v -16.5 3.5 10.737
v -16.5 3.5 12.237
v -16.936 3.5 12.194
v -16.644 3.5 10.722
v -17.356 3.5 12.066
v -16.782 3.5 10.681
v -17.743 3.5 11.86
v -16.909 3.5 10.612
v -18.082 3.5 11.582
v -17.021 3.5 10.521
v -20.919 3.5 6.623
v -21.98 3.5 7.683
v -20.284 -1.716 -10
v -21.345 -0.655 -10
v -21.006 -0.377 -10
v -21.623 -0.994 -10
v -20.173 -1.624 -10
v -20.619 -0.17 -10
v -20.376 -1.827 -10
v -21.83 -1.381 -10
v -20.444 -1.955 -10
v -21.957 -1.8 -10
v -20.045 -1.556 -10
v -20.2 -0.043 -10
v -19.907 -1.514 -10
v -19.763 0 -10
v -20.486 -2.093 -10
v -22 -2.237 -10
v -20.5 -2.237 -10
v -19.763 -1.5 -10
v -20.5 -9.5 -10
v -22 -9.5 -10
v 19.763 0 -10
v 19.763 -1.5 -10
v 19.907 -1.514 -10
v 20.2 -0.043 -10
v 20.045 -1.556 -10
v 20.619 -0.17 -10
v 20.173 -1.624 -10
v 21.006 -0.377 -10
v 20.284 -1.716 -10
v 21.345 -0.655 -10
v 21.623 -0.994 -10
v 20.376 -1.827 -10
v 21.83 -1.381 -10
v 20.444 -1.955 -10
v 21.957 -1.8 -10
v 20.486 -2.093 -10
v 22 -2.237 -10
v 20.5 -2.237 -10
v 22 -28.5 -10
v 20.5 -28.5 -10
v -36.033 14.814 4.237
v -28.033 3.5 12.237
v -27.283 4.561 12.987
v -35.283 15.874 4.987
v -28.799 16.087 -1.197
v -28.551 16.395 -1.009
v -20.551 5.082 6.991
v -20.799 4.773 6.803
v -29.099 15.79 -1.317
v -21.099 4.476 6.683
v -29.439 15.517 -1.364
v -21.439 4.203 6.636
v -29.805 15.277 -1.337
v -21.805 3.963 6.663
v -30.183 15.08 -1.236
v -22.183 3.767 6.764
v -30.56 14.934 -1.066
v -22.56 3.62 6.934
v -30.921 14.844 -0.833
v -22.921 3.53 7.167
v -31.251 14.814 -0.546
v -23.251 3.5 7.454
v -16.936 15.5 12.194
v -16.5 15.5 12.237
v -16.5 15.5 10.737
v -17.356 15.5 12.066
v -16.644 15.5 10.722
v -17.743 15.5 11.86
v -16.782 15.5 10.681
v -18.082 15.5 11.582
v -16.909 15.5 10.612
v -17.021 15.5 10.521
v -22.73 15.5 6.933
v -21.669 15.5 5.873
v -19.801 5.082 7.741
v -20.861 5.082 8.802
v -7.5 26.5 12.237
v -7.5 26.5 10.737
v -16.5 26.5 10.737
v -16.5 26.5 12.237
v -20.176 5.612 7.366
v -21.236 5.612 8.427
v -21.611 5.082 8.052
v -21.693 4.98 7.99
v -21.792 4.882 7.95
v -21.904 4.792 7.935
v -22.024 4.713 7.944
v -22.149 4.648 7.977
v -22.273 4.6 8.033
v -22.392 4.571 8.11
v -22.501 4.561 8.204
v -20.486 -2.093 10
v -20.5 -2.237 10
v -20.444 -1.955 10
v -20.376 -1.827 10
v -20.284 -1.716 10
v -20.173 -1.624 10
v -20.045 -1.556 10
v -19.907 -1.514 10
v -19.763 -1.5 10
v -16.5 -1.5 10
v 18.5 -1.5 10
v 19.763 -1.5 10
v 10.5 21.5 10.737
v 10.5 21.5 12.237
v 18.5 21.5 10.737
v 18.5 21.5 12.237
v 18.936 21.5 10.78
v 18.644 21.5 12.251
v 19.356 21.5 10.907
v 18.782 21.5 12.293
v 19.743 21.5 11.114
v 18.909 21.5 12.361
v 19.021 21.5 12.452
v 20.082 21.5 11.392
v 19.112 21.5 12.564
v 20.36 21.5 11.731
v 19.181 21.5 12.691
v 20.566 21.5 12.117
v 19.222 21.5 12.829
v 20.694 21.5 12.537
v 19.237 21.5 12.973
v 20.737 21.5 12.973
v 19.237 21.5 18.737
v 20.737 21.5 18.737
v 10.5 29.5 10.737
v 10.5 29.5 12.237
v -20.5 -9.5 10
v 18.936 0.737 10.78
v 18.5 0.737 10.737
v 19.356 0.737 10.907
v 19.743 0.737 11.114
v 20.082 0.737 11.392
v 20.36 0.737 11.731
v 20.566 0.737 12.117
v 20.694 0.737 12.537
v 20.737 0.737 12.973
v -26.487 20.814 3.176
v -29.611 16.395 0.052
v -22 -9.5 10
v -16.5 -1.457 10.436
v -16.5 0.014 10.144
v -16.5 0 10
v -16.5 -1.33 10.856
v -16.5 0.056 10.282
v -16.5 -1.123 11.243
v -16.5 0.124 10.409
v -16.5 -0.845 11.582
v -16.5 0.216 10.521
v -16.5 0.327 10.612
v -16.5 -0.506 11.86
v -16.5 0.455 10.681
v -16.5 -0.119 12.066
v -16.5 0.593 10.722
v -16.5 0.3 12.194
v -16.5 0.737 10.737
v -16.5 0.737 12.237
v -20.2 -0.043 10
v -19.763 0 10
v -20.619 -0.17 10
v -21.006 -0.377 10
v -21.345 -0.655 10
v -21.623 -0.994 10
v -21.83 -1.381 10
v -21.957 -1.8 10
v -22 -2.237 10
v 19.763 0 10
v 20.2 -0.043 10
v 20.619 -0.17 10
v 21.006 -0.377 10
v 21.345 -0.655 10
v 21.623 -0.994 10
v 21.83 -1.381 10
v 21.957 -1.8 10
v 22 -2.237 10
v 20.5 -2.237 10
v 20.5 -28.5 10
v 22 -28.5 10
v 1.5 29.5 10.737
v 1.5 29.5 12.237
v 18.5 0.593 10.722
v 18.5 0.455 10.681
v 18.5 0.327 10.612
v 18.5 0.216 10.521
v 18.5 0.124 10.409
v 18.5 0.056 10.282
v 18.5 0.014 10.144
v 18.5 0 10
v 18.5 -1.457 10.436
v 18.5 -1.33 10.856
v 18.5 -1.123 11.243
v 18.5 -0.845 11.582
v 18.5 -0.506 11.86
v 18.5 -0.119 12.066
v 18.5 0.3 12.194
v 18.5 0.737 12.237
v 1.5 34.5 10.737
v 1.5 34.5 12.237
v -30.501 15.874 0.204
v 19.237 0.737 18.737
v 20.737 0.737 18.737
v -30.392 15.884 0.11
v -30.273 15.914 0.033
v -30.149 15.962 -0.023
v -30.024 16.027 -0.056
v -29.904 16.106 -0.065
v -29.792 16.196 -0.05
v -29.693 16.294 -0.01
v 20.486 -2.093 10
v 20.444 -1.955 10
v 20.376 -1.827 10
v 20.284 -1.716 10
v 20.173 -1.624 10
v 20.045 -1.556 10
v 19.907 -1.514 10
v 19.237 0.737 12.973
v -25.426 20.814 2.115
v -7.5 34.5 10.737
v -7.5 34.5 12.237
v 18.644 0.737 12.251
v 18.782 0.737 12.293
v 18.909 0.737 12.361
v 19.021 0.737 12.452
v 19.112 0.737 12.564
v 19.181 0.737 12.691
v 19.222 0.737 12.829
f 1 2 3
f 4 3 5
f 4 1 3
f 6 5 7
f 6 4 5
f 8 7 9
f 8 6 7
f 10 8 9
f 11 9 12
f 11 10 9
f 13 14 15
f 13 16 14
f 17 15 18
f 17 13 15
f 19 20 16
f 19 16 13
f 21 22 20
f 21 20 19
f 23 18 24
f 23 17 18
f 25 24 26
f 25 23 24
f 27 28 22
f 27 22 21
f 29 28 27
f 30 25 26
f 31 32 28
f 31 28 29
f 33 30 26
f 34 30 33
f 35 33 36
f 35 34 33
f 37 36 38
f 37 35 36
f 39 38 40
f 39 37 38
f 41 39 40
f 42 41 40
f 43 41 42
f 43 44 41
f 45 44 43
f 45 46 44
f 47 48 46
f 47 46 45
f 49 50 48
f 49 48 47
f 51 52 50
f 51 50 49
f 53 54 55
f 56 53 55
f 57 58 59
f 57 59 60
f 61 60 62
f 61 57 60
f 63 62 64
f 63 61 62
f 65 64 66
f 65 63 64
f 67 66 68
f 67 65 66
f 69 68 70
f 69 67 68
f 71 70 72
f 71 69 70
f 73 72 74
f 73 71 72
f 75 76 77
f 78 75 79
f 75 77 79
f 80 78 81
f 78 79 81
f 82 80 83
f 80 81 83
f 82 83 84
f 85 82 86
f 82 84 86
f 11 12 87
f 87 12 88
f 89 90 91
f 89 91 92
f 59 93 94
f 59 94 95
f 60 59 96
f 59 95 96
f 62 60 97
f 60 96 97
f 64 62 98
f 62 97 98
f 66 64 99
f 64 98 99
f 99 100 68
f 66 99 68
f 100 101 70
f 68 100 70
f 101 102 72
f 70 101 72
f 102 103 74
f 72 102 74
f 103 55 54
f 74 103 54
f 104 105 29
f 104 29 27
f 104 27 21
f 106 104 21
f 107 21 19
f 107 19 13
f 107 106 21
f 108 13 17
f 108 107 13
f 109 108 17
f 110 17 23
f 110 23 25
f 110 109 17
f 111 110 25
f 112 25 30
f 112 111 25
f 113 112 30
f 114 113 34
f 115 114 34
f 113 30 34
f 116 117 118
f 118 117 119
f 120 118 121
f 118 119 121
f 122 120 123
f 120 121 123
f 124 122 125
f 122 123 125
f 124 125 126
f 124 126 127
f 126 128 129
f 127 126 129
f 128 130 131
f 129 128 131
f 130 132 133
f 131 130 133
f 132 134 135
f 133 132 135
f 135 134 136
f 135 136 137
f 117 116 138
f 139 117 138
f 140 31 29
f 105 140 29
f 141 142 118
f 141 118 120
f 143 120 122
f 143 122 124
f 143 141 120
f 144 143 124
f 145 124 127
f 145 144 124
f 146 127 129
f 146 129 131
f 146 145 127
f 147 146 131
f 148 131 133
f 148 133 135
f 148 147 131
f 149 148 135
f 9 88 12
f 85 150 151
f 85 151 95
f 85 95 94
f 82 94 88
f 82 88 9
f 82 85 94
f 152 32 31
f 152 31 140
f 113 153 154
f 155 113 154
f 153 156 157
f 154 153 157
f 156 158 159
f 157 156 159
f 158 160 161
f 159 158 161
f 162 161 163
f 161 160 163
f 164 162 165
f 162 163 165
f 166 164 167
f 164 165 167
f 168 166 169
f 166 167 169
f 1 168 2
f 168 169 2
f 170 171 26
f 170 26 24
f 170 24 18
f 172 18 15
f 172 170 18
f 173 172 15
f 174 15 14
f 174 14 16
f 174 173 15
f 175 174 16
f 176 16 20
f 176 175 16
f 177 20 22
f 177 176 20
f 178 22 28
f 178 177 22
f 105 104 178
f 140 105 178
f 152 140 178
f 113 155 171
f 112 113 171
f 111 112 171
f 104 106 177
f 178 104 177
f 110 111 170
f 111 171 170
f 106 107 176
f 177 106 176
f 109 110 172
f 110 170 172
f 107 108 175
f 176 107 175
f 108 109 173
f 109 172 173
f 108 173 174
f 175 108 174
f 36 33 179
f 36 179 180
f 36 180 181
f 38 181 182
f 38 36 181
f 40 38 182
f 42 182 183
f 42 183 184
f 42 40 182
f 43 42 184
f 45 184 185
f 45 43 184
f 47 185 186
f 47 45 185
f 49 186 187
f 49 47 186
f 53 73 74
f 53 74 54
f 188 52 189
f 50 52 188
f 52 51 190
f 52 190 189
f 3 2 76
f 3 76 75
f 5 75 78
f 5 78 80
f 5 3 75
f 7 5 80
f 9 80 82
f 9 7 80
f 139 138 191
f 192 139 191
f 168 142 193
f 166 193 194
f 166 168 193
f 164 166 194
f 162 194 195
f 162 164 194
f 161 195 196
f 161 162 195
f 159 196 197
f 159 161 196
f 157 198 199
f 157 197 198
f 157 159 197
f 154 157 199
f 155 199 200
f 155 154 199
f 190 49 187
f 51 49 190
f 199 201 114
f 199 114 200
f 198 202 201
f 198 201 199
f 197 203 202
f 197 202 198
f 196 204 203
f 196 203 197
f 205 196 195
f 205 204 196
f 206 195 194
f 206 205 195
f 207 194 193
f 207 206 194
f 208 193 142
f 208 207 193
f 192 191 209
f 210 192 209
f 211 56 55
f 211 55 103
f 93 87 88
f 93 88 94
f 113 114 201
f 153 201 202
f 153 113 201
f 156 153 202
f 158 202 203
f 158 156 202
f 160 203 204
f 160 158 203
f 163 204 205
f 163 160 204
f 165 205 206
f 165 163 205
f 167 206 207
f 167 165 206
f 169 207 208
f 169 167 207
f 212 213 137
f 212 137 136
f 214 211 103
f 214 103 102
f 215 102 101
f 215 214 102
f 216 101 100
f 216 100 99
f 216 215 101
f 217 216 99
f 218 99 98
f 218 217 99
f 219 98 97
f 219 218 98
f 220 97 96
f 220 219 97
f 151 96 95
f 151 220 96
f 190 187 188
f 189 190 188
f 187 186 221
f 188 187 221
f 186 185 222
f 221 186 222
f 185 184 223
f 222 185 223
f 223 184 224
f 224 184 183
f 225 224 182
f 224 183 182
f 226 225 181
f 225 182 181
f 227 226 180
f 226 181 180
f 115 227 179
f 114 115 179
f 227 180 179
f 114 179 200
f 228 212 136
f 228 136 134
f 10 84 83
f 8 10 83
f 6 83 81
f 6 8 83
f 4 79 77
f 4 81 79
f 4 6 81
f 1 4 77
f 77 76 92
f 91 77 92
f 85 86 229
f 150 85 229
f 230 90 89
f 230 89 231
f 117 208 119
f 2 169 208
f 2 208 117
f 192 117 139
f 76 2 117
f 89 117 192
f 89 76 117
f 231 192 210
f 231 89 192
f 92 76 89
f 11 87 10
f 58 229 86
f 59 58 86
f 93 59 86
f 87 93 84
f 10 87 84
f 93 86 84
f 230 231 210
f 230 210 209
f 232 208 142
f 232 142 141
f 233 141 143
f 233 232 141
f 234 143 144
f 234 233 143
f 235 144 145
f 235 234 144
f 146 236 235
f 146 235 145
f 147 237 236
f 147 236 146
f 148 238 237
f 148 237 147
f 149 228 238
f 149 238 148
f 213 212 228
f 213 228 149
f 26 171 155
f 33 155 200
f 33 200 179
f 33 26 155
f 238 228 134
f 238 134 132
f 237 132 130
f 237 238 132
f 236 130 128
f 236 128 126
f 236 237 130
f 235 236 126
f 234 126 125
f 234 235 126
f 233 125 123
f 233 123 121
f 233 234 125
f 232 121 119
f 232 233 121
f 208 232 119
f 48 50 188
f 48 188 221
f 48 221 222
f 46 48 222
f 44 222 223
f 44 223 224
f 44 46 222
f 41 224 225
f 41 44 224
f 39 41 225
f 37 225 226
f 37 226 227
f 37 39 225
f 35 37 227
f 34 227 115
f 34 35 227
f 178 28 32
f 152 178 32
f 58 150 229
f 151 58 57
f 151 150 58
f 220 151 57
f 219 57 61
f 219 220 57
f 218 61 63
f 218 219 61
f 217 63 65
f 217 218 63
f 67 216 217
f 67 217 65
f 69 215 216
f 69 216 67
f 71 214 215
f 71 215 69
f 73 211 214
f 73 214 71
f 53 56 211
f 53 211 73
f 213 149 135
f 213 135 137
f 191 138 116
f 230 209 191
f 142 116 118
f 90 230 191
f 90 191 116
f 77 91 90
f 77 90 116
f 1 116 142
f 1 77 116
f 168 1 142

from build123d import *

# Parameters (mm, degrees)
CROQUIS2_W                         = 44
CROQUIS2_H                         = 20
BRIDA_BASE1_DEPTH                  = 1.5
BRIDA_DE_ARISTA1_STRIP_W           = 7.4732
BRIDA_DE_ARISTA1_STRIP_H           = 1.5
BRIDA_DE_ARISTA1_STRIP_CUT_DEPTH   = 20
BRIDA_DE_ARISTA1_STRIP_2_W         = 7.4732
BRIDA_DE_ARISTA1_STRIP_2_H         = 1.5
BRIDA_DE_ARISTA1_STRIP_CUT_2_DEPTH = 20
BRIDA_DE_ARISTA1_DEPTH             = 20
BRIDA_DE_ARISTA1_BEND_DEPTH        = 20
CROQUIS13_W                        = 20
CROQUIS13_H                        = 19
CORTAR_EXTRUIR1_DEPTH              = 2
BRIDA_DE_ARISTA2_DEPTH             = 39.5268
CORTAR_EXTRUIR2_START              = -22.2366
CORTAR_EXTRUIR2_OUTLINE_W          = 3.2634
CORTAR_EXTRUIR2_OUTLINE_H          = 39
CORTAR_EXTRUIR2_OUTLINE_W_2        = 1.2634
CORTAR_EXTRUIR2_DEPTH              = 2.2366
CROQUIS38_W                        = 9
CROQUIS38_H                        = 8
CORTAR_EXTRUIR3_DEPTH              = 35
BRIDA_DE_ARISTA3_DEPTH             = 20.7634
BRIDA_DE_ARISTA6_DEPTH             = 25.7634
CROQUIS51_W                        = 6.573569946
CROQUIS51_H                        = 2.7634
CROQUIS51_H_2                      = 11
CORTAR_EXTRUIR4_DEPTH              = 2
SALIENTE_EXTRUIR1_DEPTH            = 1.5
CORTAR_EXTRUIR5_DEPTH              = 51.641612746
CORTAR_EXTRUIR5_DEPTH_BACK         = 51.641612746
CROQUIS53_W                        = 1.581515027
CROQUIS53_H                        = 11
CROQUIS53_H_2                      = 2.7634
BRIDA_DE_ARISTA7_STRIP_W           = 7.4732
BRIDA_DE_ARISTA7_STRIP_H           = 1.5
BRIDA_DE_ARISTA7_STRIP_CUT_DEPTH   = 16
BRIDA_DE_ARISTA7_RELIEF_W          = 8.2232
BRIDA_DE_ARISTA7_RELIEF_H          = 0.75
BRIDA_DE_ARISTA7_RELIEF_CUT_DEPTH  = 1.5
BRIDA_DE_ARISTA7_DEPTH             = 16


# Read off the part's stored shape, not the designer's step: Cortar-Extruir2
# Sheet-metal steps are written as plain solids
with BuildPart() as part:
    # Croquis2 → Brida base1 (new body)
    with BuildSketch(Plane(origin=(0, 0, 0), x_dir=(1, 0, 0), z_dir=(0, 1, 0))):
        Rectangle(CROQUIS2_W, CROQUIS2_H)
    extrude(amount=-BRIDA_BASE1_DEPTH)

    # Brida de arista1 strip (across the edge) → Brida de arista1 strip cut (cut)
    with BuildSketch(Plane(origin=(-22, -1.5, 10), x_dir=(1, 0, 0), z_dir=(0, 0, -1))):
        with Locations((-1.5, -0.75)):
            Rectangle(BRIDA_DE_ARISTA1_STRIP_W, BRIDA_DE_ARISTA1_STRIP_H)
    extrude(amount=BRIDA_DE_ARISTA1_STRIP_CUT_DEPTH, mode=Mode.SUBTRACT)

    # Brida de arista1 strip 2 (across the edge) → Brida de arista1 strip cut 2 (cut)
    with BuildSketch(Plane(origin=(22, -1.5, -10), x_dir=(-1, 0, 0), z_dir=(0, 0, 1))):
        with Locations((-1.5, -0.75)):
            Rectangle(BRIDA_DE_ARISTA1_STRIP_2_W, BRIDA_DE_ARISTA1_STRIP_2_H)
    extrude(amount=BRIDA_DE_ARISTA1_STRIP_CUT_2_DEPTH, mode=Mode.SUBTRACT)

    # Brida de arista1 section (across the edge) → Brida de arista1 (add)
    with BuildSketch(Plane(origin=(-22, -1.5, 10), x_dir=(1, 0, 0), z_dir=(0, 0, -1))):
        with BuildLine():
            Line((0, 0.7366), (0, 27))
            Line((0, 27), (1.5, 27))
            Line((1.5, 27), (1.5, 0.7366))
            ThreePointArc((1.5, 0.7366), (1.715745145, 0.215745145), (2.2366, 0))
            Line((2.2366, 0), (2.2366, -1.5))
            ThreePointArc((2.2366, -1.5), (0.655084973, -0.844915027), (0, 0.7366))
        make_face()
    extrude(amount=BRIDA_DE_ARISTA1_DEPTH)

    # Brida de arista1 section 2 (across the edge) → Brida de arista1 bend (add)
    with BuildSketch(Plane(origin=(22, -1.5, -10), x_dir=(-1, 0, 0), z_dir=(0, 0, 1))):
        with BuildLine():
            Line((0, 0.7366), (0, 27))
            Line((0, 27), (1.5, 27))
            Line((1.5, 27), (1.5, 0.7366))
            ThreePointArc((1.5, 0.7366), (1.715745145, 0.215745145), (2.2366, 0))
            Line((2.2366, 0), (2.2366, -1.5))
            ThreePointArc((2.2366, -1.5), (0.655084973, -0.844915027), (0, 0.7366))
        make_face()
    extrude(amount=BRIDA_DE_ARISTA1_BEND_DEPTH)

    # Croquis13 → Cortar-Extruir1 (cut)
    with BuildSketch(Plane.ZY.offset(22)):
        with Locations((0, -19)):
            Rectangle(CROQUIS13_W, CROQUIS13_H)
    extrude(amount=-CORTAR_EXTRUIR1_DEPTH, mode=Mode.SUBTRACT)

    # Brida de arista2 section (across the edge) → Brida de arista2 (add)
    with BuildSketch(Plane(origin=(-19.7634, 0, 10.7366), x_dir=(0, 0, -1), z_dir=(1, 0, 0))):
        with BuildLine():
            Line((-1.5, 0.7366), (-1.5, 34.5))
            Line((-1.5, 34.5), (0, 34.5))
            Line((0, 34.5), (0, 0.7366))
            ThreePointArc((0, 0.7366), (0.215745145, 0.215745145), (0.7366, 0))
            Line((0.7366, 0), (0.7366, -1.5))
            ThreePointArc((0.7366, -1.5), (-0.844915027, -0.844915027), (-1.5, 0.7366))
        make_face()
    extrude(amount=BRIDA_DE_ARISTA2_DEPTH)

    # Cortar-Extruir2 outline → Cortar-Extruir2 (cut)
    with BuildSketch(Plane(origin=(0, 0, -10), x_dir=(-1, 0, 0), z_dir=(0, 0, -1)).offset(CORTAR_EXTRUIR2_START)):
        with Locations((18.1317, 16.5)):
            Rectangle(CORTAR_EXTRUIR2_OUTLINE_W, CORTAR_EXTRUIR2_OUTLINE_H)
        with Locations((-19.1317, 16.5)):
            Rectangle(CORTAR_EXTRUIR2_OUTLINE_W_2, CORTAR_EXTRUIR2_OUTLINE_H)
    extrude(amount=CORTAR_EXTRUIR2_DEPTH, mode=Mode.SUBTRACT)

    # Croquis38 → Cortar-Extruir3 (cut)
    with BuildSketch(Plane(origin=(0, 0, 10.7366), x_dir=(-1, 0, 0), z_dir=(0, 0, -1))):
        with Locations((12, 30.5)):
            Rectangle(CROQUIS38_W, CROQUIS38_H)
        Polygon((-1.5, 34.5), (-10.5, 34.5), (-18.5, 34.5), (-18.5, 21.5), (-10.5, 21.5), (-10.5, 29.5), (-1.5, 29.5), align=None)
    extrude(amount=-CORTAR_EXTRUIR3_DEPTH, mode=Mode.SUBTRACT)

    # Brida de arista3 section (across the edge) → Brida de arista3 (add)
    with BuildSketch(Plane(origin=(19.2366, 0.7366, 12.2366), x_dir=(-1, 0, 0), z_dir=(0, 1, 0))):
        with BuildLine():
            Line((-1.5, 0.7366), (-1.5, 6.5))
            Line((-1.5, 6.5), (0, 6.5))
            Line((0, 6.5), (0, 0.7366))
            ThreePointArc((0, 0.7366), (0.215745145, 0.215745145), (0.7366, 0))
            Line((0.7366, 0), (0.7366, -1.5))
            ThreePointArc((0.7366, -1.5), (-0.844915027, -0.844915027), (-1.5, 0.7366))
        make_face()
    extrude(amount=BRIDA_DE_ARISTA3_DEPTH)

    # Brida de arista6 section (across the edge) → Brida de arista6 (add)
    with BuildSketch(Plane(origin=(-16.80510971, 0.7366, 10.7366), x_dir=(0.7071067811865438, 0, -0.7071067811865512), z_dir=(0, 1, 0))):
        with BuildLine():
            Line((-1.5, 0.30510971), (-1.5, 6.878679656))
            Line((-1.5, 6.878679656), (0, 6.878679656))
            Line((0, 6.878679656), (0, 0.30510971))
            ThreePointArc((0, 0.30510971), (0.056070336, 0.023225094), (0.215745145, -0.215745145))
            Line((0.215745145, -0.215745145), (-0.844915027, -1.276405317))
            ThreePointArc((-0.844915027, -1.276405317), (-1.329748962, -0.550800055), (-1.5, 0.30510971))
        make_face()
    extrude(amount=BRIDA_DE_ARISTA6_DEPTH)

    # Croquis51 → Cortar-Extruir4 (cut)
    with BuildSketch(Plane(origin=(-13.770854855, 0, 13.770854855), x_dir=(-0.7071067811865513, 0, -0.7071067811865438), z_dir=(0.7071067811865438, 0, -0.7071067811865513))):
        with Locations((7.882979051, 2.1183)):
            Rectangle(CROQUIS51_W, CROQUIS51_H)
        with Locations((7.882979051, 21)):
            Rectangle(CROQUIS51_W, CROQUIS51_H_2)
    extrude(amount=-CORTAR_EXTRUIR4_DEPTH, mode=Mode.SUBTRACT)

    # Croquis52 → Saliente-Extruir1 (add)
    with BuildSketch(Plane(origin=(-13.770854855, 0, 13.770854855), x_dir=(-0.7071067811865513, 0, -0.7071067811865438), z_dir=(0.7071067811865438, 0, -0.7071067811865513))):
        Polygon((11.169764024, 15.5), (16.483472523, 20.813708499), (22.483472523, 14.813708499), (11.169764024, 3.5), align=None)
    extrude(amount=-SALIENTE_EXTRUIR1_DEPTH)

    # Croquis53 → Cortar-Extruir5 (cut, two sides: drawn at the far end of the back side and taken through both)
    with BuildSketch(Plane(origin=(0, 0, 10.7366), x_dir=(-1, 0, 0), z_dir=(0, 0, -1)).offset(-CORTAR_EXTRUIR5_DEPTH_BACK)):
        with Locations((17.290757514, 21)):
            Rectangle(CROQUIS53_W, CROQUIS53_H)
        with Locations((17.290757514, 2.1183)):
            Rectangle(CROQUIS53_W, CROQUIS53_H_2)
    extrude(amount=CORTAR_EXTRUIR5_DEPTH + CORTAR_EXTRUIR5_DEPTH_BACK, mode=Mode.SUBTRACT)

    # Brida de arista7 strip (across the edge) → Brida de arista7 strip cut (cut)
    with BuildSketch(Plane(origin=(-30.729730913, 14.813708499, -1.066700859), x_dir=(0.5000000000000012, 0.7071067811865457, 0.5000000000000013), z_dir=(0.5000000000000016, -0.7071067811865495, 0.49999999999999595))):
        with Locations((-1.5, -0.75)):
            Rectangle(BRIDA_DE_ARISTA7_STRIP_W, BRIDA_DE_ARISTA7_STRIP_H)
    extrude(amount=BRIDA_DE_ARISTA7_STRIP_CUT_DEPTH, mode=Mode.SUBTRACT)

    # Brida de arista7 relief (on the sheet) → Brida de arista7 relief cut (cut)
    with BuildSketch(Plane(origin=(-29.611430913, 16.395223526, 0.051599141), x_dir=(0.4999999999999988, 0.7071067811865457, 0.5000000000000038), z_dir=(-0.7071067811865475, -5.355429995107666e-15, 0.7071067811865478))):
        with Locations((-3.3616, -16.375)):
            Rectangle(BRIDA_DE_ARISTA7_RELIEF_W, BRIDA_DE_ARISTA7_RELIEF_H)
    extrude(amount=-BRIDA_DE_ARISTA7_RELIEF_CUT_DEPTH, mode=Mode.SUBTRACT)

    # Brida de arista7 section (across the edge) → Brida de arista7 (add)
    with BuildSketch(Plane(origin=(-30.729730913, 14.813708499, -1.066700859), x_dir=(0.5000000000000012, 0.7071067811865457, 0.5000000000000013), z_dir=(0.5000000000000016, -0.7071067811865495, 0.49999999999999595))):
        with BuildLine():
            Line((0, 0.7366), (0, 7.5))
            Line((0, 7.5), (1.5, 7.5))
            Line((1.5, 7.5), (1.5, 0.7366))
            ThreePointArc((1.5, 0.7366), (1.715745145, 0.215745145), (2.2366, 0))
            Line((2.2366, 0), (2.2366, -1.5))
            ThreePointArc((2.2366, -1.5), (0.655084973, -0.844915027), (0, 0.7366))
        make_face()
    extrude(amount=BRIDA_DE_ARISTA7_DEPTH)


solid = part.part
